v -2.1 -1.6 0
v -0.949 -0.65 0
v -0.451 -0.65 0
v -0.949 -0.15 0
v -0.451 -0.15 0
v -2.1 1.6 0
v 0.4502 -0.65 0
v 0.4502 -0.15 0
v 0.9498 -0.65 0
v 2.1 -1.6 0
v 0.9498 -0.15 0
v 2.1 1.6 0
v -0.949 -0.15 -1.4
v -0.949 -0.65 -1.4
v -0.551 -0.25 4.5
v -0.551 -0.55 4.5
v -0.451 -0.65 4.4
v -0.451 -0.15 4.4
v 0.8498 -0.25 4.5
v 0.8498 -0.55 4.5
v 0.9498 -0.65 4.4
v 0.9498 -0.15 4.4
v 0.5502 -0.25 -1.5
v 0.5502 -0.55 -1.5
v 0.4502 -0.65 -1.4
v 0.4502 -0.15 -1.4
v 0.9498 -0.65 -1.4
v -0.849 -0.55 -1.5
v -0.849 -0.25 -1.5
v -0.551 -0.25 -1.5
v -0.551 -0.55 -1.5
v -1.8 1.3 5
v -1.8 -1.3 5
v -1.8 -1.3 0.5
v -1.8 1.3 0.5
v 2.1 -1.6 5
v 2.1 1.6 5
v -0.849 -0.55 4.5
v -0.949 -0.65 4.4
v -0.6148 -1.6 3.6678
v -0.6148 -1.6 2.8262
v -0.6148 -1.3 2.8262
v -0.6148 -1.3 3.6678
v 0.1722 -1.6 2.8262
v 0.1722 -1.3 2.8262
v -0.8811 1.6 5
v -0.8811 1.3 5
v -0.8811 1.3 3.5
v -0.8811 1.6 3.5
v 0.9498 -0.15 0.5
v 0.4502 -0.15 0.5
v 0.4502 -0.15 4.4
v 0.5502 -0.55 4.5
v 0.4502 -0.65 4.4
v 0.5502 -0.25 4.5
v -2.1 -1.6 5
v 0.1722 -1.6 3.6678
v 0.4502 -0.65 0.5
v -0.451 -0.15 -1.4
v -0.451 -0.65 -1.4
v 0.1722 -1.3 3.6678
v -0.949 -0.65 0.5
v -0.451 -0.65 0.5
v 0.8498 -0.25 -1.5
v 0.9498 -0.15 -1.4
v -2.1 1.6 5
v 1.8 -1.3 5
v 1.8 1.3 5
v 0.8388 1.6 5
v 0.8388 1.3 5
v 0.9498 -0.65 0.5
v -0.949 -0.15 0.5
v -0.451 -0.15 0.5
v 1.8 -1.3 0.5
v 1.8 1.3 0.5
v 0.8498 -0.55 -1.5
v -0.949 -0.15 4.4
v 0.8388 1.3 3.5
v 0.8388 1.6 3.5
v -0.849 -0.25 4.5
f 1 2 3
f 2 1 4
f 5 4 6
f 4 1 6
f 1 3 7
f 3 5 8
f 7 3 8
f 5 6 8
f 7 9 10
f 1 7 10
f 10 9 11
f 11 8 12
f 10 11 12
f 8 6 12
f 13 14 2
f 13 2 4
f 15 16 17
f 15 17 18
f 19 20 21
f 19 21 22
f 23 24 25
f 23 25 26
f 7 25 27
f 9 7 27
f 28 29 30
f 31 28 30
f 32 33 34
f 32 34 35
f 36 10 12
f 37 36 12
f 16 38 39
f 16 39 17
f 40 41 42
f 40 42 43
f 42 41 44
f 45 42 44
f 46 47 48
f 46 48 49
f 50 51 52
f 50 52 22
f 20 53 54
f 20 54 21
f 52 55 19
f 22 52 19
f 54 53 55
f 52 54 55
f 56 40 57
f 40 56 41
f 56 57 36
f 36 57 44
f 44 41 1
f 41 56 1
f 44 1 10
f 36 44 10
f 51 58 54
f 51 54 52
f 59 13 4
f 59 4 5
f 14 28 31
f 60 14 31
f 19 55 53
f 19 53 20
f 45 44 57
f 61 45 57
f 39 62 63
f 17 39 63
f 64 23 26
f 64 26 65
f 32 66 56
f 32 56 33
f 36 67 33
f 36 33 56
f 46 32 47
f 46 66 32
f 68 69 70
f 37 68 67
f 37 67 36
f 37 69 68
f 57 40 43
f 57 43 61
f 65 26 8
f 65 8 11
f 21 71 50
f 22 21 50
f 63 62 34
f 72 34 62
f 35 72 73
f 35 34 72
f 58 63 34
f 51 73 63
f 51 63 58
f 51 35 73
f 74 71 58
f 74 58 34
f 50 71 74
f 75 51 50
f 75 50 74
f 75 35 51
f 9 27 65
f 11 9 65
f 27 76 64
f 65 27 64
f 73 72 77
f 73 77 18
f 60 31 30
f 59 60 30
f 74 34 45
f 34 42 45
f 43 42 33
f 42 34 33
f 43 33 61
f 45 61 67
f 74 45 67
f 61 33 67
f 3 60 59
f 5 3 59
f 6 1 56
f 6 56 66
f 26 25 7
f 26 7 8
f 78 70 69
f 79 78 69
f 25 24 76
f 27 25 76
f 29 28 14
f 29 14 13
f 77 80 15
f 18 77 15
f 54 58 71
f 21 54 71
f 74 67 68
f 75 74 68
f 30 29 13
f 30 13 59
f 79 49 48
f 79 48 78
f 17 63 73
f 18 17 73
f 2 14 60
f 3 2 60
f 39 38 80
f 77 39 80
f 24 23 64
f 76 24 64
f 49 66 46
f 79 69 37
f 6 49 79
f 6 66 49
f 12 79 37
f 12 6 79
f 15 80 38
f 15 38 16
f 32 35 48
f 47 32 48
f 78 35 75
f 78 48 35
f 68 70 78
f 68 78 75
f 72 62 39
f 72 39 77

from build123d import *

# Parameters (mm, degrees)
SKETCH_1_W           = 4.2
SKETCH_1_H           = 3.2
EXTRUDE_1_DEPTH      = 5
SKETCH_2_W           = 3.6
SKETCH_2_H           = 2.6
CUT_EXTRUDE_2_DEPTH  = 4.5
SKETCH_10_W          = 1.719860591
SKETCH_10_H          = 0.3
CUT_EXTRUDE_6_DEPTH  = 1.5
EXTRUDE_2_DEPTH      = 4
EXTRUDE_2_DEPTH_BACK = 2
SKETCH_12_W          = 0.497980778
SKETCH_12_H          = 0.499968878
SKETCH_12_W_2        = 0.49954636
CHAMFER_2_SIZE       = 0.1
CHAMFER_3_SIZE       = 0.1
SKETCH_13_W          = 0.786936725
SKETCH_13_H          = 0.841611244
CUT_EXTRUDE_7_DEPTH  = 0.5


with BuildPart() as part:
    # 草图1 → 凸台-拉伸1 (new body)
    with BuildSketch(Plane.XY):
        Rectangle(SKETCH_1_W, SKETCH_1_H)
    extrude(amount=EXTRUDE_1_DEPTH)

    # 草图2 → 切除-拉伸2 (cut)
    with BuildSketch(Plane.XY.offset(5)):
        Rectangle(SKETCH_2_W, SKETCH_2_H)
    extrude(amount=-CUT_EXTRUDE_2_DEPTH, mode=Mode.SUBTRACT)

    # 草图10 → 切除-拉伸6 (cut)
    with BuildSketch(Plane.XY.offset(5)):
        with Locations((-0.021149262, 1.45)):
            Rectangle(SKETCH_10_W, SKETCH_10_H)
    extrude(amount=-CUT_EXTRUDE_6_DEPTH, mode=Mode.SUBTRACT)

    # 草图12 → 凸台-拉伸2 (add, two sides: drawn at the far end of the back side and taken through both)
    with BuildSketch(Plane.XY.offset(0.5).offset(-EXTRUDE_2_DEPTH_BACK)):
        with Locations((-0.7, -0.4)):
            Rectangle(SKETCH_12_W, SKETCH_12_H)
        with Locations((0.7, -0.4)):
            Rectangle(SKETCH_12_W_2, SKETCH_12_H)
    extrude(amount=EXTRUDE_2_DEPTH + EXTRUDE_2_DEPTH_BACK)

    # 倒角2
    chamfer_2_edges = [part.edges().sort_by_distance(p)[0] for p in [
        (-0.451009611, -0.4, 4.5),
        (-0.7, -0.150015561, 4.5),
        (-0.948990389, -0.4, 4.5),
        (-0.7, -0.649984439, 4.5),
        (0.94977318, -0.4, 4.5),
        (0.7, -0.150015561, 4.5),
        (0.45022682, -0.4, 4.5),
        (0.7, -0.649984439, 4.5),
    ]]
    chamfer(chamfer_2_edges, length=CHAMFER_2_SIZE)

    # 倒角3
    chamfer_3_edges = [part.edges().sort_by_distance(p)[0] for p in [
        (-0.451009611, -0.4, -1.5),
        (-0.7, -0.649984439, -1.5),
        (-0.948990389, -0.4, -1.5),
        (-0.7, -0.150015561, -1.5),
        (0.94977318, -0.4, -1.5),
        (0.7, -0.649984439, -1.5),
        (0.45022682, -0.4, -1.5),
        (0.7, -0.150015561, -1.5),
    ]]
    chamfer(chamfer_3_edges, length=CHAMFER_3_SIZE)

    # 草图13 → 切除-拉伸7 (cut)
    with BuildSketch(Plane.XZ.offset(1.6)):
        with Locations((-0.221312495, 3.247007401)):
            Rectangle(SKETCH_13_W, SKETCH_13_H)
    extrude(amount=-CUT_EXTRUDE_7_DEPTH, mode=Mode.SUBTRACT)


solid = part.part
